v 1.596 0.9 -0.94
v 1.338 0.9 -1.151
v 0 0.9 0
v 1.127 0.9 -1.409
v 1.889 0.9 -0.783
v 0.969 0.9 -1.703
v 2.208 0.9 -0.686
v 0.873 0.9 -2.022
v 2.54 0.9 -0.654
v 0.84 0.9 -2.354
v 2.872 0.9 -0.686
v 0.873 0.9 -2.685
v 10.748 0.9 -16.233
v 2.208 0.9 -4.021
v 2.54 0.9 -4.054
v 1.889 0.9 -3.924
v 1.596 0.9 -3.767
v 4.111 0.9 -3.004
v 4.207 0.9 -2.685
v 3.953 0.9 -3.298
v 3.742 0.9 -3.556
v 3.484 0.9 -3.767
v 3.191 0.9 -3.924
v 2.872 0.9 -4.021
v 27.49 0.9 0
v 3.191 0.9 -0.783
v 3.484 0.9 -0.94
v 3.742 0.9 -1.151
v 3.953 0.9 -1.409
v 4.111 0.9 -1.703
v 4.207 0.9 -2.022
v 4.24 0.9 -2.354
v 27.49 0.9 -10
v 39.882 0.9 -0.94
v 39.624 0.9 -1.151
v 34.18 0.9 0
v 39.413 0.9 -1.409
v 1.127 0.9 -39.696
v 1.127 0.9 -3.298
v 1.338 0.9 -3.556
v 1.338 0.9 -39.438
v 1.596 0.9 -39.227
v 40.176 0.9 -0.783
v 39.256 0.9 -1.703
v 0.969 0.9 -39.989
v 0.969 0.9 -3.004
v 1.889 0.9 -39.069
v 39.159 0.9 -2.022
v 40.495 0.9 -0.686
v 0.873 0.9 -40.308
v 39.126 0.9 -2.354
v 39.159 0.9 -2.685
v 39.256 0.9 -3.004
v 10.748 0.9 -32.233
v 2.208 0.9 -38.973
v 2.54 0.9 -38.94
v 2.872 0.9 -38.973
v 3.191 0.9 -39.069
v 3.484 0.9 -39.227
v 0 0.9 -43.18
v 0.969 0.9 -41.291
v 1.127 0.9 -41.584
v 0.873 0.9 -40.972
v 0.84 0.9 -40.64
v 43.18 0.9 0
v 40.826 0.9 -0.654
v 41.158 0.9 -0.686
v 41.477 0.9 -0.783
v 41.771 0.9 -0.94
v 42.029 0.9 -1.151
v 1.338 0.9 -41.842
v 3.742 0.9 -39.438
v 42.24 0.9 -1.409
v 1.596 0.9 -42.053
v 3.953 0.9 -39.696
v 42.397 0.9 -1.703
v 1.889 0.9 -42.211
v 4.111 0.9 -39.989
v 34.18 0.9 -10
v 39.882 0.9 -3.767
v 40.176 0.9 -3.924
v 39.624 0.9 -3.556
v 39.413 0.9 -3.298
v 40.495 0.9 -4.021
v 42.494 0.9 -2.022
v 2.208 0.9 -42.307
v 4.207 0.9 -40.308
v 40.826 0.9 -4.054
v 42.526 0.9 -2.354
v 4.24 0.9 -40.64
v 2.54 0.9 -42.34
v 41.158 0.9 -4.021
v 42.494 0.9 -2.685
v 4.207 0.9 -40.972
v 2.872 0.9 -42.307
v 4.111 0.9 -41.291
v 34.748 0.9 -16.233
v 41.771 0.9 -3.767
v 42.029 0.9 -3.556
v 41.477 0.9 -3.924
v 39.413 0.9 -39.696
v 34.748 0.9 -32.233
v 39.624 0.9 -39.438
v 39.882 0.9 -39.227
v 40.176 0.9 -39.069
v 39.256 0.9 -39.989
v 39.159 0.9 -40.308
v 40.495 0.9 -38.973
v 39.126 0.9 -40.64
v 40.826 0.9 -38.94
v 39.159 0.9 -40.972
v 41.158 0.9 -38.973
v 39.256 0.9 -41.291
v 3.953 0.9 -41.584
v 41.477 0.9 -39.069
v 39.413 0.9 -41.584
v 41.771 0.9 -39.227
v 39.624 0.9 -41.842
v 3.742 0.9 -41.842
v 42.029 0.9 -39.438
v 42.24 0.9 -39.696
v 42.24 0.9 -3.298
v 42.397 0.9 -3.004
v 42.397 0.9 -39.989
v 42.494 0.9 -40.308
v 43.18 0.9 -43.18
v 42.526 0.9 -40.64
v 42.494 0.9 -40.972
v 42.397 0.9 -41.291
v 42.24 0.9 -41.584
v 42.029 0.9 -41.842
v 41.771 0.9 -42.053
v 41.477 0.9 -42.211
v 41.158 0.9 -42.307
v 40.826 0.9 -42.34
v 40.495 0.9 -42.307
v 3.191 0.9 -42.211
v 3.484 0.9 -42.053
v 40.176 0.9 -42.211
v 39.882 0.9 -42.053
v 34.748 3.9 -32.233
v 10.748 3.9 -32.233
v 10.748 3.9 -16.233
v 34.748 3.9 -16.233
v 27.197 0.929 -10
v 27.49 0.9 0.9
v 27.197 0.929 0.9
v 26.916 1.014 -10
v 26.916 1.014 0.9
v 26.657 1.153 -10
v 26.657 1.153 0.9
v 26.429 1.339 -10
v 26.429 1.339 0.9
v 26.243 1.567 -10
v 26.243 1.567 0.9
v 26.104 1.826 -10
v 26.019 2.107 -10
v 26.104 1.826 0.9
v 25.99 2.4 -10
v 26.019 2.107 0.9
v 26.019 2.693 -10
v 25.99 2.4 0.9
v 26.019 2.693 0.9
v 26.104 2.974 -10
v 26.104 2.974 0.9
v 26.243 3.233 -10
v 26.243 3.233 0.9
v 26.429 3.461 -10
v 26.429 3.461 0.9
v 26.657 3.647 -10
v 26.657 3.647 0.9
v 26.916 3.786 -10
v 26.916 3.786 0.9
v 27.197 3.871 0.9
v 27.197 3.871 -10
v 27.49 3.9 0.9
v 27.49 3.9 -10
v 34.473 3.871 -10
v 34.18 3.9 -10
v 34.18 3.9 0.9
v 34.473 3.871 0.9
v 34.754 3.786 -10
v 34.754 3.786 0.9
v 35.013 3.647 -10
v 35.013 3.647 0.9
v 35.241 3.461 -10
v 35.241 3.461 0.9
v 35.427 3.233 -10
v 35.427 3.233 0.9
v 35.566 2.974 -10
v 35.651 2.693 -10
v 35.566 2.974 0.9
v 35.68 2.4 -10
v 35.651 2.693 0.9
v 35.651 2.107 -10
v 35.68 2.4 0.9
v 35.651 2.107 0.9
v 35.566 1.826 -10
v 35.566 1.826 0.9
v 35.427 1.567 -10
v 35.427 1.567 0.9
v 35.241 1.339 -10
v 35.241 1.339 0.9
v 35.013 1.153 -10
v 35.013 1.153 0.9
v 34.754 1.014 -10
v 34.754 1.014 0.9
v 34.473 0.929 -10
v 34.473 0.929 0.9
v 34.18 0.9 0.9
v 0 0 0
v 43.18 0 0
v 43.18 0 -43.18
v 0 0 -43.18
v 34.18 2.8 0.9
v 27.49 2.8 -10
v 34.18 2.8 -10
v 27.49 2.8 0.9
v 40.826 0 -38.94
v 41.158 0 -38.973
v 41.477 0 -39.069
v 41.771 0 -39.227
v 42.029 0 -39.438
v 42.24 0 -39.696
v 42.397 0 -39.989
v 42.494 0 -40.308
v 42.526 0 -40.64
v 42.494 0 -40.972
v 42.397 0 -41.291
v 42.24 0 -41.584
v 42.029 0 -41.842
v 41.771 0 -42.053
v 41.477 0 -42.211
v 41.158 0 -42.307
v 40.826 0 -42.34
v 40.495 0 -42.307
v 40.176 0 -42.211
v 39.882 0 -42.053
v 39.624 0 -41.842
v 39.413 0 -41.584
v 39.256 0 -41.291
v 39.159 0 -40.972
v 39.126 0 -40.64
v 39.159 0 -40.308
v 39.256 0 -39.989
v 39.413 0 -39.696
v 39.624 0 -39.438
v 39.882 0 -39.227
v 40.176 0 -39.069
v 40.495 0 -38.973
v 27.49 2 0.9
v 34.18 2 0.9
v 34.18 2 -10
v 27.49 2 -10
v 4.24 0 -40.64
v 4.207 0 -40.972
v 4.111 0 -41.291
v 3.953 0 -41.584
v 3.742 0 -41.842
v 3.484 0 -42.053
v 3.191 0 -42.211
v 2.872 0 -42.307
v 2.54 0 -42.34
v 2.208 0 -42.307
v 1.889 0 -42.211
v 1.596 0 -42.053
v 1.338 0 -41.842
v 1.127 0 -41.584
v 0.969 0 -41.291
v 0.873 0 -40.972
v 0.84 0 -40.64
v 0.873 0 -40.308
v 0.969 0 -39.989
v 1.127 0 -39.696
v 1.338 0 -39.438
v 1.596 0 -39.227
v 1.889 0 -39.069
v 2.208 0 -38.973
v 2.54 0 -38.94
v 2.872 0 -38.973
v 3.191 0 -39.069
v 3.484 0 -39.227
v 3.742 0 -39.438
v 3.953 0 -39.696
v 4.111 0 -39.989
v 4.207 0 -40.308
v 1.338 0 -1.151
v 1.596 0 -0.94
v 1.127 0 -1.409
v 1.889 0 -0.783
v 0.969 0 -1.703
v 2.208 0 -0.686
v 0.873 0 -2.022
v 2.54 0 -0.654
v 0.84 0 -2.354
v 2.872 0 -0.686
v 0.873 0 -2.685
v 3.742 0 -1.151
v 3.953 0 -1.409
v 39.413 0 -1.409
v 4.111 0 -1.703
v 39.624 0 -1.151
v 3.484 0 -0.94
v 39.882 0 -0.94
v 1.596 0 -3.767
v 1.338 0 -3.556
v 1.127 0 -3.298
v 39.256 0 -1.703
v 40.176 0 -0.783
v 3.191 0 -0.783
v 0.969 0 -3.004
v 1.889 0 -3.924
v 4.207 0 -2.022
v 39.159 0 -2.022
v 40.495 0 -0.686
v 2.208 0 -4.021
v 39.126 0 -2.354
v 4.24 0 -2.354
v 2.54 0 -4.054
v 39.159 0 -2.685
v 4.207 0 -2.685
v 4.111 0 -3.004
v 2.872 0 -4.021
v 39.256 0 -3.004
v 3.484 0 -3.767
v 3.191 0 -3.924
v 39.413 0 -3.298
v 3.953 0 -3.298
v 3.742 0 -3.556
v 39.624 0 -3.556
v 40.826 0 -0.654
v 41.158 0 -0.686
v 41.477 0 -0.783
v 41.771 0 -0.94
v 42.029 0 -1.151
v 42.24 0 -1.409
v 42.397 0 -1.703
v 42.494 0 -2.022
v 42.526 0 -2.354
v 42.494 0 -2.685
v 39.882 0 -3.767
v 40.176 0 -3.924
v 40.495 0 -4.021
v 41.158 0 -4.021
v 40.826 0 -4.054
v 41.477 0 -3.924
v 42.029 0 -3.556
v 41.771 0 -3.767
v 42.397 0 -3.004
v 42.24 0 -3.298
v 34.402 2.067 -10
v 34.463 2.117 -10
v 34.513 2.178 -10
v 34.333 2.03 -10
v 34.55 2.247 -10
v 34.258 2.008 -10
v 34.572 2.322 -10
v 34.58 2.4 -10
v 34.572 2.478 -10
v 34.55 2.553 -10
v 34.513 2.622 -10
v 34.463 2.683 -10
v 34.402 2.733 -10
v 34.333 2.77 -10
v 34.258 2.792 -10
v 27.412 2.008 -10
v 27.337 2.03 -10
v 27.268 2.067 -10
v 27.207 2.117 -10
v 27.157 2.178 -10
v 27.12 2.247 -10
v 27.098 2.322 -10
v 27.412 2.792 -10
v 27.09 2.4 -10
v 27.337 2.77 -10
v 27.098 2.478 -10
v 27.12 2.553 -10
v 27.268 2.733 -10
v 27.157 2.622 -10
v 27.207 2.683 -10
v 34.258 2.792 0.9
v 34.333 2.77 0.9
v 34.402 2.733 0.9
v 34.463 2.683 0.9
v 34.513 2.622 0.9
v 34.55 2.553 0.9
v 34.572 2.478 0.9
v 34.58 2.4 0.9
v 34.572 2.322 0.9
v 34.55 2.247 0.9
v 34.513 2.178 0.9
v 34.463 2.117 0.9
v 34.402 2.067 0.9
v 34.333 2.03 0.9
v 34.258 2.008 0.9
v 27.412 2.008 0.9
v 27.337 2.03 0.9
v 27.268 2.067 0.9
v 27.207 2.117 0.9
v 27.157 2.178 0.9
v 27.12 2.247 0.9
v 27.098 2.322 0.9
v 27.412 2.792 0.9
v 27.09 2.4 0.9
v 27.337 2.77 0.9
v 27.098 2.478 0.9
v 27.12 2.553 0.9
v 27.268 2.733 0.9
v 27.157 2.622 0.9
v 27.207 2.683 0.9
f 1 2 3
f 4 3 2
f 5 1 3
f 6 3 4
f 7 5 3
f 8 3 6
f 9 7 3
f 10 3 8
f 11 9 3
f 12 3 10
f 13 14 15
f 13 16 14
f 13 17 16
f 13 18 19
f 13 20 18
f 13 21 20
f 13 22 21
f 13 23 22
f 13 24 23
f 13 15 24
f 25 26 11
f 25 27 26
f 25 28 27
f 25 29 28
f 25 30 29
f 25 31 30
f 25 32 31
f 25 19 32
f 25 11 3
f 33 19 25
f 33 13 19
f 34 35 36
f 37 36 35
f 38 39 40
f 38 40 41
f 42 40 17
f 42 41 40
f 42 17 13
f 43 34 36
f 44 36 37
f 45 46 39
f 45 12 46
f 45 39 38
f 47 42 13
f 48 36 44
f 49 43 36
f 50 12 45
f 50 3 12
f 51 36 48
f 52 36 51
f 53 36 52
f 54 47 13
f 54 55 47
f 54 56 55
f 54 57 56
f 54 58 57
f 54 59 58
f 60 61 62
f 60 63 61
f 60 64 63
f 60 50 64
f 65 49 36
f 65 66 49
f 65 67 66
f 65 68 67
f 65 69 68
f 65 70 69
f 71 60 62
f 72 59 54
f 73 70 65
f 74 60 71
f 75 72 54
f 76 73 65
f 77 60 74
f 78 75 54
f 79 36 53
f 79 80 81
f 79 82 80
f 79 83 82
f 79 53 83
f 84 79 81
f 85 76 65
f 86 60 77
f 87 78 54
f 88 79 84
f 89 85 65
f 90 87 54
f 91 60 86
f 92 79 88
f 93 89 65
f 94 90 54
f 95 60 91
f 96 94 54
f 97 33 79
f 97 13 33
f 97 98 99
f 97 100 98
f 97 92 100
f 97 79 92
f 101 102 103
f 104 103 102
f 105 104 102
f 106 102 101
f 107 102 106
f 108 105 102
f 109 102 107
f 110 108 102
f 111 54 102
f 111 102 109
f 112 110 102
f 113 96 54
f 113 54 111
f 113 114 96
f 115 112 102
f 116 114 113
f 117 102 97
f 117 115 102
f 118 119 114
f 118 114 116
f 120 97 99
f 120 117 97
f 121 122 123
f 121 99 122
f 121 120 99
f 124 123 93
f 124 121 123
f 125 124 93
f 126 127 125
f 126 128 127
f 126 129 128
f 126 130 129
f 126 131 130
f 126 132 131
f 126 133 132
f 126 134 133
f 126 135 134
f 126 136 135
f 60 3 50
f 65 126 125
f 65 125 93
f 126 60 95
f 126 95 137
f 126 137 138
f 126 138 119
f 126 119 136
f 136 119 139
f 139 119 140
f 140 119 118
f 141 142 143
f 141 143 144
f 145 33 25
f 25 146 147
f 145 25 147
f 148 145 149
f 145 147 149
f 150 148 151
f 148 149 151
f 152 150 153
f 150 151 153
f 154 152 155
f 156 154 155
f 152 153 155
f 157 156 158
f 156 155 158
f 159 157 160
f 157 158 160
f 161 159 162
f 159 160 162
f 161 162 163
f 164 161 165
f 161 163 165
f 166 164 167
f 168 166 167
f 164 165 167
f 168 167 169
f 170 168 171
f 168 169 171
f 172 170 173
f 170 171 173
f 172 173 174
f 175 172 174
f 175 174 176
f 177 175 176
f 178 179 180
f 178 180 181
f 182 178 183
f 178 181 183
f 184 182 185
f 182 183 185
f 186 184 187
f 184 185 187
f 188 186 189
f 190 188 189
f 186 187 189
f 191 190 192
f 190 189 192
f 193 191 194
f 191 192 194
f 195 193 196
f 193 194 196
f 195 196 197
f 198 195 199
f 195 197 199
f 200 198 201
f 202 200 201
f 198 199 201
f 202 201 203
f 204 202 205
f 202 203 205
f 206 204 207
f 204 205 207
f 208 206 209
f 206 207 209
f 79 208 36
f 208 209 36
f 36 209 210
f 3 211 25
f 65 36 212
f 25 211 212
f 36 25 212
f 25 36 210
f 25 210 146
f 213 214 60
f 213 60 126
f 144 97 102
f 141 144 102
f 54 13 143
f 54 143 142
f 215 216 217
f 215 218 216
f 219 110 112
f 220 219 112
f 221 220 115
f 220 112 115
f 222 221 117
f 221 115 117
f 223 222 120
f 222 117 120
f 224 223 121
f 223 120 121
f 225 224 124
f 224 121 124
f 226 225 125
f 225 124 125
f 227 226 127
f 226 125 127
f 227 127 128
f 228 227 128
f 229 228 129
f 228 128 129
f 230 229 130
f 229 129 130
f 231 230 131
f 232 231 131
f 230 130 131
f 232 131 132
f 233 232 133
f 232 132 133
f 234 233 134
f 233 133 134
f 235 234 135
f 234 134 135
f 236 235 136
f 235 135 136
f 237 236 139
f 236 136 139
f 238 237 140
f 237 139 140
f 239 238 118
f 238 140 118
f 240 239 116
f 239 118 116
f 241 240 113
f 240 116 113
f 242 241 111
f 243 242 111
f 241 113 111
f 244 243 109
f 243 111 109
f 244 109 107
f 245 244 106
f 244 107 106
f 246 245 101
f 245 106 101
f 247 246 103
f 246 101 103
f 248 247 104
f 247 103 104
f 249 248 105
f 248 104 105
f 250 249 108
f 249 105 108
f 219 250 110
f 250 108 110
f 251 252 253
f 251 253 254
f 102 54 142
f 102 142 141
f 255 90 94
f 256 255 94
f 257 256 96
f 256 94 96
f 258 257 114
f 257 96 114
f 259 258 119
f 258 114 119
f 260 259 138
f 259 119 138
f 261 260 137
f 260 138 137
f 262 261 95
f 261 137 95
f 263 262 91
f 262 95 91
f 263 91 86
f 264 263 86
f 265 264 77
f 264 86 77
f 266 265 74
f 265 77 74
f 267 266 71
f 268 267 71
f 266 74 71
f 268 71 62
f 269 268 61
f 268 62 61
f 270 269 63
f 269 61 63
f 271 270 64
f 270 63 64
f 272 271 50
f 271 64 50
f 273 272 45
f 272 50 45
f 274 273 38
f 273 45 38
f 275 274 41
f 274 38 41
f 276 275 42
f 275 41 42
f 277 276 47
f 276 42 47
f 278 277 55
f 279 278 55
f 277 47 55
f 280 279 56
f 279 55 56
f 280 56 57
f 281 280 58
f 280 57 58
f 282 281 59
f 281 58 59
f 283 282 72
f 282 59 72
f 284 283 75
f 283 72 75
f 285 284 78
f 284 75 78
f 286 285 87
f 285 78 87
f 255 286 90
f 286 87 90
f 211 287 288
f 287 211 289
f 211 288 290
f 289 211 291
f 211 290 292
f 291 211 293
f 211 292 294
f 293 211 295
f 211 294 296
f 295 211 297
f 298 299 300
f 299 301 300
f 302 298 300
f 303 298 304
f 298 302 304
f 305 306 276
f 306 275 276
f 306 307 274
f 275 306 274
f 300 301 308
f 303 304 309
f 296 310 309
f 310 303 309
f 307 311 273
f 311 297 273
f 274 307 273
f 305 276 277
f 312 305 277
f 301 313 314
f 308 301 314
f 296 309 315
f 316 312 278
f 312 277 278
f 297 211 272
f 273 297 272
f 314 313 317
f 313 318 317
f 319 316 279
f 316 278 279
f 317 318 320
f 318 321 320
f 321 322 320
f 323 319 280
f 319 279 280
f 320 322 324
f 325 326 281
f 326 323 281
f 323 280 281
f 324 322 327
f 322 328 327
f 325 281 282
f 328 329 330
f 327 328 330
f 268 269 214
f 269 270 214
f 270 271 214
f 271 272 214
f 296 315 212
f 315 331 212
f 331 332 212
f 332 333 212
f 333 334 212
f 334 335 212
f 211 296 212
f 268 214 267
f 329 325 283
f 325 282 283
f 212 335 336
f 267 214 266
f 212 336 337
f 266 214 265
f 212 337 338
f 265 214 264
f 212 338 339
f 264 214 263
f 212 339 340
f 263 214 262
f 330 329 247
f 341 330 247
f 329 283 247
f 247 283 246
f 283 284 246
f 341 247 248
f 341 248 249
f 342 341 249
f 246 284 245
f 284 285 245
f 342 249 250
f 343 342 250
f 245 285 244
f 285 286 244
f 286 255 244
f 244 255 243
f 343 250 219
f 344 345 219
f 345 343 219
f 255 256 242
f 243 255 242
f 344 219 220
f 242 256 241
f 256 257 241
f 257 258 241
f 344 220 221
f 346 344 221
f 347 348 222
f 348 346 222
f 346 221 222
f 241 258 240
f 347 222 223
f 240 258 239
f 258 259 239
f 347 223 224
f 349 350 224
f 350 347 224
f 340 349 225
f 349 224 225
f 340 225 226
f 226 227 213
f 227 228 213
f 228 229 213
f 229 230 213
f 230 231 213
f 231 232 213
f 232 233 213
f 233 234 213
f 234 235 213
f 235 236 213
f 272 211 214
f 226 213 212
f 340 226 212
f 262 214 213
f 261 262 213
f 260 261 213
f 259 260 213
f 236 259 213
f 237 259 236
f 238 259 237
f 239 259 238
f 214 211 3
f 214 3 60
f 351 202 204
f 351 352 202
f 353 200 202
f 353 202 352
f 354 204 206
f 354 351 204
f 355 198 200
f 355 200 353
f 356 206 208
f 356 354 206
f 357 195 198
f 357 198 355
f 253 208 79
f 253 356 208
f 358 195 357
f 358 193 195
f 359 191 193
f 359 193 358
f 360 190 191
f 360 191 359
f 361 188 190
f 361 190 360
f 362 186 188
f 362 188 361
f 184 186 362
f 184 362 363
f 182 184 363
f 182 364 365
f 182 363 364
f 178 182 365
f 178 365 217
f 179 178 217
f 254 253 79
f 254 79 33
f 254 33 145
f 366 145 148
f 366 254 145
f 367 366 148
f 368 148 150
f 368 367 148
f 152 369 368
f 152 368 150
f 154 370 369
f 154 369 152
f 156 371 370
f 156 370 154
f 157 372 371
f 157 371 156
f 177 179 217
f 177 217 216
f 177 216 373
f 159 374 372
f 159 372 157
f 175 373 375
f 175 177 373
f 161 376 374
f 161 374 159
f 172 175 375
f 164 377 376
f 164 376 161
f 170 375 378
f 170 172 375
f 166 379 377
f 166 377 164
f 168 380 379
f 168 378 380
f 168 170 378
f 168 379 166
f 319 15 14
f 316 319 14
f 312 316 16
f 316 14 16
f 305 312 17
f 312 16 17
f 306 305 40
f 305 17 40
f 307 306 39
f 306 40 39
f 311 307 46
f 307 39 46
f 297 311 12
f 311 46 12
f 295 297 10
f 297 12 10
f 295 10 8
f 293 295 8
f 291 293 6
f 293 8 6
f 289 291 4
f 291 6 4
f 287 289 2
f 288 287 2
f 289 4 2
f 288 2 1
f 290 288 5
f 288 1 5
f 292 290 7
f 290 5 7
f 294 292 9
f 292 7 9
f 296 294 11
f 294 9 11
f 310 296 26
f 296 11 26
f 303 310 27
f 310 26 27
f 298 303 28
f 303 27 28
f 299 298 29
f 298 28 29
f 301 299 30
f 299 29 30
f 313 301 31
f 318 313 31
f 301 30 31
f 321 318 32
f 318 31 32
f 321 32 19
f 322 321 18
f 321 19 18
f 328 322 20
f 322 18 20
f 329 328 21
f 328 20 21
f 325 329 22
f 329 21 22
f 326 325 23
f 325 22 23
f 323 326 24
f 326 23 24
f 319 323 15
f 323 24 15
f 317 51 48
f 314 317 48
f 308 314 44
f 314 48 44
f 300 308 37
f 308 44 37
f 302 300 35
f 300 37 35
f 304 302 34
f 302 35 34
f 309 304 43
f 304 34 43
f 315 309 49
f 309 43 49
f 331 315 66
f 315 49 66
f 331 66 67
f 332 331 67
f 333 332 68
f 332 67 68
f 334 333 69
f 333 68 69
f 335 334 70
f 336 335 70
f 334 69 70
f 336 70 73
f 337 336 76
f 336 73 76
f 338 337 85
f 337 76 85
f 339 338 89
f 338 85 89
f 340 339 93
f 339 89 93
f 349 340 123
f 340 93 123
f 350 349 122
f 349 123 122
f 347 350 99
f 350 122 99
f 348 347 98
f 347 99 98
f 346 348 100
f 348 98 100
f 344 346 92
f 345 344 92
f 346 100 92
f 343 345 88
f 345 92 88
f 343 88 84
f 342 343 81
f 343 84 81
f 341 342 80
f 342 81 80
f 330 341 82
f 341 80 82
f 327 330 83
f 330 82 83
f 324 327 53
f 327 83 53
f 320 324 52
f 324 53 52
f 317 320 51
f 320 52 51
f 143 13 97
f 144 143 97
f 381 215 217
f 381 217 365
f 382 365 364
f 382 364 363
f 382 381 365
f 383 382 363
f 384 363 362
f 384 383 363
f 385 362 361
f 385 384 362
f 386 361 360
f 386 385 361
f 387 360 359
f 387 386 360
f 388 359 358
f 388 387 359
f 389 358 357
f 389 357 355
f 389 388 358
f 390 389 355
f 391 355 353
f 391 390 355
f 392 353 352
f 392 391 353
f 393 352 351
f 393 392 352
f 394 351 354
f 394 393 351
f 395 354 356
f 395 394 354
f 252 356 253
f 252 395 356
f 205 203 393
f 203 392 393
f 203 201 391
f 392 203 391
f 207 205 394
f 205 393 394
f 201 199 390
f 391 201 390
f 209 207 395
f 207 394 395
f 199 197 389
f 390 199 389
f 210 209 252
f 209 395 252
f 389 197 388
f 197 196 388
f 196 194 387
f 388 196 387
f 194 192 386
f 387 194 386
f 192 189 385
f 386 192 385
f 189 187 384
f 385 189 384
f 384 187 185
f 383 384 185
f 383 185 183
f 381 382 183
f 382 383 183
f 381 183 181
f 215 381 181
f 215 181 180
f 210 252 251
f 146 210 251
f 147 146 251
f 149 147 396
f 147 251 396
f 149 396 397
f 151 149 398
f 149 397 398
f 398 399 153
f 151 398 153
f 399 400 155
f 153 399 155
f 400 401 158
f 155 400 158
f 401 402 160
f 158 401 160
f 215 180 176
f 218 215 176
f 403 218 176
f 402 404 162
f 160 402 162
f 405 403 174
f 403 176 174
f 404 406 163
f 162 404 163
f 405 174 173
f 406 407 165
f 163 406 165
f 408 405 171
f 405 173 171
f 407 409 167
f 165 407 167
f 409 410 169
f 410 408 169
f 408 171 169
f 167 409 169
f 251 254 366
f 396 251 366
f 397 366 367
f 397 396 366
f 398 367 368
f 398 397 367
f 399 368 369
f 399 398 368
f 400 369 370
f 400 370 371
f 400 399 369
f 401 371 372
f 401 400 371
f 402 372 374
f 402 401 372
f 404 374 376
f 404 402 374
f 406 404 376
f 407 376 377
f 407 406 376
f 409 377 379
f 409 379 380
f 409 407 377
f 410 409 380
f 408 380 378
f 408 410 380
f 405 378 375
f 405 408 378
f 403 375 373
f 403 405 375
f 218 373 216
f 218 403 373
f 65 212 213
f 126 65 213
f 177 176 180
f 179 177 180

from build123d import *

# Parameters (mm, degrees)
SKETCH1_W                = 43.18
SKETCH1_H                = 43.18
BOSS_EXTRUDE1_DEPTH      = 0.9
SKETCH2_R                = 1.7
CUT_EXTRUDE1_DEPTH       = 0.9
CIRPATTERN1_COUNT        = 4
BOSS_EXTRUDE2_DEPTH      = 0.9
BOSS_EXTRUDE2_DEPTH_BACK = 10
SKETCH5_W                = 24
SKETCH5_H                = 16
BOSS_EXTRUDE3_DEPTH      = 3


with BuildPart() as part:
    # Sketch1 → Boss-Extrude1 (new body)
    with BuildSketch(Plane(origin=(0, 0, 0), x_dir=(1, 0, 0), z_dir=(0, 1, 0))):
        with Locations((21.59, 21.59)):
            Rectangle(SKETCH1_W, SKETCH1_H)
    extrude(amount=BOSS_EXTRUDE1_DEPTH)

    # Sketch2 → Cut-Extrude1 (cut)
    with BuildSketch(Plane(origin=(0, 0.9, 0), x_dir=(1, 0, 0), z_dir=(0, 1, 0))):
        with Locations((2.54, 40.64)):
            Circle(SKETCH2_R)
    cut_extrude1 = extrude(amount=-CUT_EXTRUDE1_DEPTH, mode=Mode.SUBTRACT)

    # CirPattern1: Cut-Extrude1 ×4 about axis
    cirpattern1_axis = Axis((21.683217483, 0, -21.496782517), (0, 1, 0))
    for i in range(1, CIRPATTERN1_COUNT):
        add(cut_extrude1.rotate(cirpattern1_axis, i * 360 / CIRPATTERN1_COUNT), mode=Mode.SUBTRACT)

    # Sketch4 → Boss-Extrude2 (add, two sides)
    with BuildSketch(Plane.XY) as boss_extrude2_sk:
        with BuildLine():
            Line((27.49, 3.9), (34.18, 3.9))
            ThreePointArc((34.18, 3.9), (35.68, 2.4), (34.18, 0.9))
            Line((34.18, 0.9), (27.49, 0.9))
            ThreePointArc((27.49, 0.9), (25.99, 2.4), (27.49, 3.9))
        make_face()
        with BuildLine():
            Line((27.49, 2.8), (34.18, 2.8))
            ThreePointArc((34.18, 2.8), (34.58, 2.4), (34.18, 2))
            Line((34.18, 2), (27.49, 2))
            ThreePointArc((27.49, 2), (27.09, 2.4), (27.49, 2.8))
        make_face(mode=Mode.SUBTRACT)
    extrude(amount=BOSS_EXTRUDE2_DEPTH)
    extrude(boss_extrude2_sk.sketch, amount=-BOSS_EXTRUDE2_DEPTH_BACK)

    # Sketch5 → Boss-Extrude3 (add)
    with BuildSketch(Plane(origin=(0, 0.9, 0), x_dir=(1, 0, 0), z_dir=(0, 1, 0))):
        with Locations((22.747653051, 24.232550554)):
            Rectangle(SKETCH5_W, SKETCH5_H)
    extrude(amount=BOSS_EXTRUDE3_DEPTH)


solid = part.part
